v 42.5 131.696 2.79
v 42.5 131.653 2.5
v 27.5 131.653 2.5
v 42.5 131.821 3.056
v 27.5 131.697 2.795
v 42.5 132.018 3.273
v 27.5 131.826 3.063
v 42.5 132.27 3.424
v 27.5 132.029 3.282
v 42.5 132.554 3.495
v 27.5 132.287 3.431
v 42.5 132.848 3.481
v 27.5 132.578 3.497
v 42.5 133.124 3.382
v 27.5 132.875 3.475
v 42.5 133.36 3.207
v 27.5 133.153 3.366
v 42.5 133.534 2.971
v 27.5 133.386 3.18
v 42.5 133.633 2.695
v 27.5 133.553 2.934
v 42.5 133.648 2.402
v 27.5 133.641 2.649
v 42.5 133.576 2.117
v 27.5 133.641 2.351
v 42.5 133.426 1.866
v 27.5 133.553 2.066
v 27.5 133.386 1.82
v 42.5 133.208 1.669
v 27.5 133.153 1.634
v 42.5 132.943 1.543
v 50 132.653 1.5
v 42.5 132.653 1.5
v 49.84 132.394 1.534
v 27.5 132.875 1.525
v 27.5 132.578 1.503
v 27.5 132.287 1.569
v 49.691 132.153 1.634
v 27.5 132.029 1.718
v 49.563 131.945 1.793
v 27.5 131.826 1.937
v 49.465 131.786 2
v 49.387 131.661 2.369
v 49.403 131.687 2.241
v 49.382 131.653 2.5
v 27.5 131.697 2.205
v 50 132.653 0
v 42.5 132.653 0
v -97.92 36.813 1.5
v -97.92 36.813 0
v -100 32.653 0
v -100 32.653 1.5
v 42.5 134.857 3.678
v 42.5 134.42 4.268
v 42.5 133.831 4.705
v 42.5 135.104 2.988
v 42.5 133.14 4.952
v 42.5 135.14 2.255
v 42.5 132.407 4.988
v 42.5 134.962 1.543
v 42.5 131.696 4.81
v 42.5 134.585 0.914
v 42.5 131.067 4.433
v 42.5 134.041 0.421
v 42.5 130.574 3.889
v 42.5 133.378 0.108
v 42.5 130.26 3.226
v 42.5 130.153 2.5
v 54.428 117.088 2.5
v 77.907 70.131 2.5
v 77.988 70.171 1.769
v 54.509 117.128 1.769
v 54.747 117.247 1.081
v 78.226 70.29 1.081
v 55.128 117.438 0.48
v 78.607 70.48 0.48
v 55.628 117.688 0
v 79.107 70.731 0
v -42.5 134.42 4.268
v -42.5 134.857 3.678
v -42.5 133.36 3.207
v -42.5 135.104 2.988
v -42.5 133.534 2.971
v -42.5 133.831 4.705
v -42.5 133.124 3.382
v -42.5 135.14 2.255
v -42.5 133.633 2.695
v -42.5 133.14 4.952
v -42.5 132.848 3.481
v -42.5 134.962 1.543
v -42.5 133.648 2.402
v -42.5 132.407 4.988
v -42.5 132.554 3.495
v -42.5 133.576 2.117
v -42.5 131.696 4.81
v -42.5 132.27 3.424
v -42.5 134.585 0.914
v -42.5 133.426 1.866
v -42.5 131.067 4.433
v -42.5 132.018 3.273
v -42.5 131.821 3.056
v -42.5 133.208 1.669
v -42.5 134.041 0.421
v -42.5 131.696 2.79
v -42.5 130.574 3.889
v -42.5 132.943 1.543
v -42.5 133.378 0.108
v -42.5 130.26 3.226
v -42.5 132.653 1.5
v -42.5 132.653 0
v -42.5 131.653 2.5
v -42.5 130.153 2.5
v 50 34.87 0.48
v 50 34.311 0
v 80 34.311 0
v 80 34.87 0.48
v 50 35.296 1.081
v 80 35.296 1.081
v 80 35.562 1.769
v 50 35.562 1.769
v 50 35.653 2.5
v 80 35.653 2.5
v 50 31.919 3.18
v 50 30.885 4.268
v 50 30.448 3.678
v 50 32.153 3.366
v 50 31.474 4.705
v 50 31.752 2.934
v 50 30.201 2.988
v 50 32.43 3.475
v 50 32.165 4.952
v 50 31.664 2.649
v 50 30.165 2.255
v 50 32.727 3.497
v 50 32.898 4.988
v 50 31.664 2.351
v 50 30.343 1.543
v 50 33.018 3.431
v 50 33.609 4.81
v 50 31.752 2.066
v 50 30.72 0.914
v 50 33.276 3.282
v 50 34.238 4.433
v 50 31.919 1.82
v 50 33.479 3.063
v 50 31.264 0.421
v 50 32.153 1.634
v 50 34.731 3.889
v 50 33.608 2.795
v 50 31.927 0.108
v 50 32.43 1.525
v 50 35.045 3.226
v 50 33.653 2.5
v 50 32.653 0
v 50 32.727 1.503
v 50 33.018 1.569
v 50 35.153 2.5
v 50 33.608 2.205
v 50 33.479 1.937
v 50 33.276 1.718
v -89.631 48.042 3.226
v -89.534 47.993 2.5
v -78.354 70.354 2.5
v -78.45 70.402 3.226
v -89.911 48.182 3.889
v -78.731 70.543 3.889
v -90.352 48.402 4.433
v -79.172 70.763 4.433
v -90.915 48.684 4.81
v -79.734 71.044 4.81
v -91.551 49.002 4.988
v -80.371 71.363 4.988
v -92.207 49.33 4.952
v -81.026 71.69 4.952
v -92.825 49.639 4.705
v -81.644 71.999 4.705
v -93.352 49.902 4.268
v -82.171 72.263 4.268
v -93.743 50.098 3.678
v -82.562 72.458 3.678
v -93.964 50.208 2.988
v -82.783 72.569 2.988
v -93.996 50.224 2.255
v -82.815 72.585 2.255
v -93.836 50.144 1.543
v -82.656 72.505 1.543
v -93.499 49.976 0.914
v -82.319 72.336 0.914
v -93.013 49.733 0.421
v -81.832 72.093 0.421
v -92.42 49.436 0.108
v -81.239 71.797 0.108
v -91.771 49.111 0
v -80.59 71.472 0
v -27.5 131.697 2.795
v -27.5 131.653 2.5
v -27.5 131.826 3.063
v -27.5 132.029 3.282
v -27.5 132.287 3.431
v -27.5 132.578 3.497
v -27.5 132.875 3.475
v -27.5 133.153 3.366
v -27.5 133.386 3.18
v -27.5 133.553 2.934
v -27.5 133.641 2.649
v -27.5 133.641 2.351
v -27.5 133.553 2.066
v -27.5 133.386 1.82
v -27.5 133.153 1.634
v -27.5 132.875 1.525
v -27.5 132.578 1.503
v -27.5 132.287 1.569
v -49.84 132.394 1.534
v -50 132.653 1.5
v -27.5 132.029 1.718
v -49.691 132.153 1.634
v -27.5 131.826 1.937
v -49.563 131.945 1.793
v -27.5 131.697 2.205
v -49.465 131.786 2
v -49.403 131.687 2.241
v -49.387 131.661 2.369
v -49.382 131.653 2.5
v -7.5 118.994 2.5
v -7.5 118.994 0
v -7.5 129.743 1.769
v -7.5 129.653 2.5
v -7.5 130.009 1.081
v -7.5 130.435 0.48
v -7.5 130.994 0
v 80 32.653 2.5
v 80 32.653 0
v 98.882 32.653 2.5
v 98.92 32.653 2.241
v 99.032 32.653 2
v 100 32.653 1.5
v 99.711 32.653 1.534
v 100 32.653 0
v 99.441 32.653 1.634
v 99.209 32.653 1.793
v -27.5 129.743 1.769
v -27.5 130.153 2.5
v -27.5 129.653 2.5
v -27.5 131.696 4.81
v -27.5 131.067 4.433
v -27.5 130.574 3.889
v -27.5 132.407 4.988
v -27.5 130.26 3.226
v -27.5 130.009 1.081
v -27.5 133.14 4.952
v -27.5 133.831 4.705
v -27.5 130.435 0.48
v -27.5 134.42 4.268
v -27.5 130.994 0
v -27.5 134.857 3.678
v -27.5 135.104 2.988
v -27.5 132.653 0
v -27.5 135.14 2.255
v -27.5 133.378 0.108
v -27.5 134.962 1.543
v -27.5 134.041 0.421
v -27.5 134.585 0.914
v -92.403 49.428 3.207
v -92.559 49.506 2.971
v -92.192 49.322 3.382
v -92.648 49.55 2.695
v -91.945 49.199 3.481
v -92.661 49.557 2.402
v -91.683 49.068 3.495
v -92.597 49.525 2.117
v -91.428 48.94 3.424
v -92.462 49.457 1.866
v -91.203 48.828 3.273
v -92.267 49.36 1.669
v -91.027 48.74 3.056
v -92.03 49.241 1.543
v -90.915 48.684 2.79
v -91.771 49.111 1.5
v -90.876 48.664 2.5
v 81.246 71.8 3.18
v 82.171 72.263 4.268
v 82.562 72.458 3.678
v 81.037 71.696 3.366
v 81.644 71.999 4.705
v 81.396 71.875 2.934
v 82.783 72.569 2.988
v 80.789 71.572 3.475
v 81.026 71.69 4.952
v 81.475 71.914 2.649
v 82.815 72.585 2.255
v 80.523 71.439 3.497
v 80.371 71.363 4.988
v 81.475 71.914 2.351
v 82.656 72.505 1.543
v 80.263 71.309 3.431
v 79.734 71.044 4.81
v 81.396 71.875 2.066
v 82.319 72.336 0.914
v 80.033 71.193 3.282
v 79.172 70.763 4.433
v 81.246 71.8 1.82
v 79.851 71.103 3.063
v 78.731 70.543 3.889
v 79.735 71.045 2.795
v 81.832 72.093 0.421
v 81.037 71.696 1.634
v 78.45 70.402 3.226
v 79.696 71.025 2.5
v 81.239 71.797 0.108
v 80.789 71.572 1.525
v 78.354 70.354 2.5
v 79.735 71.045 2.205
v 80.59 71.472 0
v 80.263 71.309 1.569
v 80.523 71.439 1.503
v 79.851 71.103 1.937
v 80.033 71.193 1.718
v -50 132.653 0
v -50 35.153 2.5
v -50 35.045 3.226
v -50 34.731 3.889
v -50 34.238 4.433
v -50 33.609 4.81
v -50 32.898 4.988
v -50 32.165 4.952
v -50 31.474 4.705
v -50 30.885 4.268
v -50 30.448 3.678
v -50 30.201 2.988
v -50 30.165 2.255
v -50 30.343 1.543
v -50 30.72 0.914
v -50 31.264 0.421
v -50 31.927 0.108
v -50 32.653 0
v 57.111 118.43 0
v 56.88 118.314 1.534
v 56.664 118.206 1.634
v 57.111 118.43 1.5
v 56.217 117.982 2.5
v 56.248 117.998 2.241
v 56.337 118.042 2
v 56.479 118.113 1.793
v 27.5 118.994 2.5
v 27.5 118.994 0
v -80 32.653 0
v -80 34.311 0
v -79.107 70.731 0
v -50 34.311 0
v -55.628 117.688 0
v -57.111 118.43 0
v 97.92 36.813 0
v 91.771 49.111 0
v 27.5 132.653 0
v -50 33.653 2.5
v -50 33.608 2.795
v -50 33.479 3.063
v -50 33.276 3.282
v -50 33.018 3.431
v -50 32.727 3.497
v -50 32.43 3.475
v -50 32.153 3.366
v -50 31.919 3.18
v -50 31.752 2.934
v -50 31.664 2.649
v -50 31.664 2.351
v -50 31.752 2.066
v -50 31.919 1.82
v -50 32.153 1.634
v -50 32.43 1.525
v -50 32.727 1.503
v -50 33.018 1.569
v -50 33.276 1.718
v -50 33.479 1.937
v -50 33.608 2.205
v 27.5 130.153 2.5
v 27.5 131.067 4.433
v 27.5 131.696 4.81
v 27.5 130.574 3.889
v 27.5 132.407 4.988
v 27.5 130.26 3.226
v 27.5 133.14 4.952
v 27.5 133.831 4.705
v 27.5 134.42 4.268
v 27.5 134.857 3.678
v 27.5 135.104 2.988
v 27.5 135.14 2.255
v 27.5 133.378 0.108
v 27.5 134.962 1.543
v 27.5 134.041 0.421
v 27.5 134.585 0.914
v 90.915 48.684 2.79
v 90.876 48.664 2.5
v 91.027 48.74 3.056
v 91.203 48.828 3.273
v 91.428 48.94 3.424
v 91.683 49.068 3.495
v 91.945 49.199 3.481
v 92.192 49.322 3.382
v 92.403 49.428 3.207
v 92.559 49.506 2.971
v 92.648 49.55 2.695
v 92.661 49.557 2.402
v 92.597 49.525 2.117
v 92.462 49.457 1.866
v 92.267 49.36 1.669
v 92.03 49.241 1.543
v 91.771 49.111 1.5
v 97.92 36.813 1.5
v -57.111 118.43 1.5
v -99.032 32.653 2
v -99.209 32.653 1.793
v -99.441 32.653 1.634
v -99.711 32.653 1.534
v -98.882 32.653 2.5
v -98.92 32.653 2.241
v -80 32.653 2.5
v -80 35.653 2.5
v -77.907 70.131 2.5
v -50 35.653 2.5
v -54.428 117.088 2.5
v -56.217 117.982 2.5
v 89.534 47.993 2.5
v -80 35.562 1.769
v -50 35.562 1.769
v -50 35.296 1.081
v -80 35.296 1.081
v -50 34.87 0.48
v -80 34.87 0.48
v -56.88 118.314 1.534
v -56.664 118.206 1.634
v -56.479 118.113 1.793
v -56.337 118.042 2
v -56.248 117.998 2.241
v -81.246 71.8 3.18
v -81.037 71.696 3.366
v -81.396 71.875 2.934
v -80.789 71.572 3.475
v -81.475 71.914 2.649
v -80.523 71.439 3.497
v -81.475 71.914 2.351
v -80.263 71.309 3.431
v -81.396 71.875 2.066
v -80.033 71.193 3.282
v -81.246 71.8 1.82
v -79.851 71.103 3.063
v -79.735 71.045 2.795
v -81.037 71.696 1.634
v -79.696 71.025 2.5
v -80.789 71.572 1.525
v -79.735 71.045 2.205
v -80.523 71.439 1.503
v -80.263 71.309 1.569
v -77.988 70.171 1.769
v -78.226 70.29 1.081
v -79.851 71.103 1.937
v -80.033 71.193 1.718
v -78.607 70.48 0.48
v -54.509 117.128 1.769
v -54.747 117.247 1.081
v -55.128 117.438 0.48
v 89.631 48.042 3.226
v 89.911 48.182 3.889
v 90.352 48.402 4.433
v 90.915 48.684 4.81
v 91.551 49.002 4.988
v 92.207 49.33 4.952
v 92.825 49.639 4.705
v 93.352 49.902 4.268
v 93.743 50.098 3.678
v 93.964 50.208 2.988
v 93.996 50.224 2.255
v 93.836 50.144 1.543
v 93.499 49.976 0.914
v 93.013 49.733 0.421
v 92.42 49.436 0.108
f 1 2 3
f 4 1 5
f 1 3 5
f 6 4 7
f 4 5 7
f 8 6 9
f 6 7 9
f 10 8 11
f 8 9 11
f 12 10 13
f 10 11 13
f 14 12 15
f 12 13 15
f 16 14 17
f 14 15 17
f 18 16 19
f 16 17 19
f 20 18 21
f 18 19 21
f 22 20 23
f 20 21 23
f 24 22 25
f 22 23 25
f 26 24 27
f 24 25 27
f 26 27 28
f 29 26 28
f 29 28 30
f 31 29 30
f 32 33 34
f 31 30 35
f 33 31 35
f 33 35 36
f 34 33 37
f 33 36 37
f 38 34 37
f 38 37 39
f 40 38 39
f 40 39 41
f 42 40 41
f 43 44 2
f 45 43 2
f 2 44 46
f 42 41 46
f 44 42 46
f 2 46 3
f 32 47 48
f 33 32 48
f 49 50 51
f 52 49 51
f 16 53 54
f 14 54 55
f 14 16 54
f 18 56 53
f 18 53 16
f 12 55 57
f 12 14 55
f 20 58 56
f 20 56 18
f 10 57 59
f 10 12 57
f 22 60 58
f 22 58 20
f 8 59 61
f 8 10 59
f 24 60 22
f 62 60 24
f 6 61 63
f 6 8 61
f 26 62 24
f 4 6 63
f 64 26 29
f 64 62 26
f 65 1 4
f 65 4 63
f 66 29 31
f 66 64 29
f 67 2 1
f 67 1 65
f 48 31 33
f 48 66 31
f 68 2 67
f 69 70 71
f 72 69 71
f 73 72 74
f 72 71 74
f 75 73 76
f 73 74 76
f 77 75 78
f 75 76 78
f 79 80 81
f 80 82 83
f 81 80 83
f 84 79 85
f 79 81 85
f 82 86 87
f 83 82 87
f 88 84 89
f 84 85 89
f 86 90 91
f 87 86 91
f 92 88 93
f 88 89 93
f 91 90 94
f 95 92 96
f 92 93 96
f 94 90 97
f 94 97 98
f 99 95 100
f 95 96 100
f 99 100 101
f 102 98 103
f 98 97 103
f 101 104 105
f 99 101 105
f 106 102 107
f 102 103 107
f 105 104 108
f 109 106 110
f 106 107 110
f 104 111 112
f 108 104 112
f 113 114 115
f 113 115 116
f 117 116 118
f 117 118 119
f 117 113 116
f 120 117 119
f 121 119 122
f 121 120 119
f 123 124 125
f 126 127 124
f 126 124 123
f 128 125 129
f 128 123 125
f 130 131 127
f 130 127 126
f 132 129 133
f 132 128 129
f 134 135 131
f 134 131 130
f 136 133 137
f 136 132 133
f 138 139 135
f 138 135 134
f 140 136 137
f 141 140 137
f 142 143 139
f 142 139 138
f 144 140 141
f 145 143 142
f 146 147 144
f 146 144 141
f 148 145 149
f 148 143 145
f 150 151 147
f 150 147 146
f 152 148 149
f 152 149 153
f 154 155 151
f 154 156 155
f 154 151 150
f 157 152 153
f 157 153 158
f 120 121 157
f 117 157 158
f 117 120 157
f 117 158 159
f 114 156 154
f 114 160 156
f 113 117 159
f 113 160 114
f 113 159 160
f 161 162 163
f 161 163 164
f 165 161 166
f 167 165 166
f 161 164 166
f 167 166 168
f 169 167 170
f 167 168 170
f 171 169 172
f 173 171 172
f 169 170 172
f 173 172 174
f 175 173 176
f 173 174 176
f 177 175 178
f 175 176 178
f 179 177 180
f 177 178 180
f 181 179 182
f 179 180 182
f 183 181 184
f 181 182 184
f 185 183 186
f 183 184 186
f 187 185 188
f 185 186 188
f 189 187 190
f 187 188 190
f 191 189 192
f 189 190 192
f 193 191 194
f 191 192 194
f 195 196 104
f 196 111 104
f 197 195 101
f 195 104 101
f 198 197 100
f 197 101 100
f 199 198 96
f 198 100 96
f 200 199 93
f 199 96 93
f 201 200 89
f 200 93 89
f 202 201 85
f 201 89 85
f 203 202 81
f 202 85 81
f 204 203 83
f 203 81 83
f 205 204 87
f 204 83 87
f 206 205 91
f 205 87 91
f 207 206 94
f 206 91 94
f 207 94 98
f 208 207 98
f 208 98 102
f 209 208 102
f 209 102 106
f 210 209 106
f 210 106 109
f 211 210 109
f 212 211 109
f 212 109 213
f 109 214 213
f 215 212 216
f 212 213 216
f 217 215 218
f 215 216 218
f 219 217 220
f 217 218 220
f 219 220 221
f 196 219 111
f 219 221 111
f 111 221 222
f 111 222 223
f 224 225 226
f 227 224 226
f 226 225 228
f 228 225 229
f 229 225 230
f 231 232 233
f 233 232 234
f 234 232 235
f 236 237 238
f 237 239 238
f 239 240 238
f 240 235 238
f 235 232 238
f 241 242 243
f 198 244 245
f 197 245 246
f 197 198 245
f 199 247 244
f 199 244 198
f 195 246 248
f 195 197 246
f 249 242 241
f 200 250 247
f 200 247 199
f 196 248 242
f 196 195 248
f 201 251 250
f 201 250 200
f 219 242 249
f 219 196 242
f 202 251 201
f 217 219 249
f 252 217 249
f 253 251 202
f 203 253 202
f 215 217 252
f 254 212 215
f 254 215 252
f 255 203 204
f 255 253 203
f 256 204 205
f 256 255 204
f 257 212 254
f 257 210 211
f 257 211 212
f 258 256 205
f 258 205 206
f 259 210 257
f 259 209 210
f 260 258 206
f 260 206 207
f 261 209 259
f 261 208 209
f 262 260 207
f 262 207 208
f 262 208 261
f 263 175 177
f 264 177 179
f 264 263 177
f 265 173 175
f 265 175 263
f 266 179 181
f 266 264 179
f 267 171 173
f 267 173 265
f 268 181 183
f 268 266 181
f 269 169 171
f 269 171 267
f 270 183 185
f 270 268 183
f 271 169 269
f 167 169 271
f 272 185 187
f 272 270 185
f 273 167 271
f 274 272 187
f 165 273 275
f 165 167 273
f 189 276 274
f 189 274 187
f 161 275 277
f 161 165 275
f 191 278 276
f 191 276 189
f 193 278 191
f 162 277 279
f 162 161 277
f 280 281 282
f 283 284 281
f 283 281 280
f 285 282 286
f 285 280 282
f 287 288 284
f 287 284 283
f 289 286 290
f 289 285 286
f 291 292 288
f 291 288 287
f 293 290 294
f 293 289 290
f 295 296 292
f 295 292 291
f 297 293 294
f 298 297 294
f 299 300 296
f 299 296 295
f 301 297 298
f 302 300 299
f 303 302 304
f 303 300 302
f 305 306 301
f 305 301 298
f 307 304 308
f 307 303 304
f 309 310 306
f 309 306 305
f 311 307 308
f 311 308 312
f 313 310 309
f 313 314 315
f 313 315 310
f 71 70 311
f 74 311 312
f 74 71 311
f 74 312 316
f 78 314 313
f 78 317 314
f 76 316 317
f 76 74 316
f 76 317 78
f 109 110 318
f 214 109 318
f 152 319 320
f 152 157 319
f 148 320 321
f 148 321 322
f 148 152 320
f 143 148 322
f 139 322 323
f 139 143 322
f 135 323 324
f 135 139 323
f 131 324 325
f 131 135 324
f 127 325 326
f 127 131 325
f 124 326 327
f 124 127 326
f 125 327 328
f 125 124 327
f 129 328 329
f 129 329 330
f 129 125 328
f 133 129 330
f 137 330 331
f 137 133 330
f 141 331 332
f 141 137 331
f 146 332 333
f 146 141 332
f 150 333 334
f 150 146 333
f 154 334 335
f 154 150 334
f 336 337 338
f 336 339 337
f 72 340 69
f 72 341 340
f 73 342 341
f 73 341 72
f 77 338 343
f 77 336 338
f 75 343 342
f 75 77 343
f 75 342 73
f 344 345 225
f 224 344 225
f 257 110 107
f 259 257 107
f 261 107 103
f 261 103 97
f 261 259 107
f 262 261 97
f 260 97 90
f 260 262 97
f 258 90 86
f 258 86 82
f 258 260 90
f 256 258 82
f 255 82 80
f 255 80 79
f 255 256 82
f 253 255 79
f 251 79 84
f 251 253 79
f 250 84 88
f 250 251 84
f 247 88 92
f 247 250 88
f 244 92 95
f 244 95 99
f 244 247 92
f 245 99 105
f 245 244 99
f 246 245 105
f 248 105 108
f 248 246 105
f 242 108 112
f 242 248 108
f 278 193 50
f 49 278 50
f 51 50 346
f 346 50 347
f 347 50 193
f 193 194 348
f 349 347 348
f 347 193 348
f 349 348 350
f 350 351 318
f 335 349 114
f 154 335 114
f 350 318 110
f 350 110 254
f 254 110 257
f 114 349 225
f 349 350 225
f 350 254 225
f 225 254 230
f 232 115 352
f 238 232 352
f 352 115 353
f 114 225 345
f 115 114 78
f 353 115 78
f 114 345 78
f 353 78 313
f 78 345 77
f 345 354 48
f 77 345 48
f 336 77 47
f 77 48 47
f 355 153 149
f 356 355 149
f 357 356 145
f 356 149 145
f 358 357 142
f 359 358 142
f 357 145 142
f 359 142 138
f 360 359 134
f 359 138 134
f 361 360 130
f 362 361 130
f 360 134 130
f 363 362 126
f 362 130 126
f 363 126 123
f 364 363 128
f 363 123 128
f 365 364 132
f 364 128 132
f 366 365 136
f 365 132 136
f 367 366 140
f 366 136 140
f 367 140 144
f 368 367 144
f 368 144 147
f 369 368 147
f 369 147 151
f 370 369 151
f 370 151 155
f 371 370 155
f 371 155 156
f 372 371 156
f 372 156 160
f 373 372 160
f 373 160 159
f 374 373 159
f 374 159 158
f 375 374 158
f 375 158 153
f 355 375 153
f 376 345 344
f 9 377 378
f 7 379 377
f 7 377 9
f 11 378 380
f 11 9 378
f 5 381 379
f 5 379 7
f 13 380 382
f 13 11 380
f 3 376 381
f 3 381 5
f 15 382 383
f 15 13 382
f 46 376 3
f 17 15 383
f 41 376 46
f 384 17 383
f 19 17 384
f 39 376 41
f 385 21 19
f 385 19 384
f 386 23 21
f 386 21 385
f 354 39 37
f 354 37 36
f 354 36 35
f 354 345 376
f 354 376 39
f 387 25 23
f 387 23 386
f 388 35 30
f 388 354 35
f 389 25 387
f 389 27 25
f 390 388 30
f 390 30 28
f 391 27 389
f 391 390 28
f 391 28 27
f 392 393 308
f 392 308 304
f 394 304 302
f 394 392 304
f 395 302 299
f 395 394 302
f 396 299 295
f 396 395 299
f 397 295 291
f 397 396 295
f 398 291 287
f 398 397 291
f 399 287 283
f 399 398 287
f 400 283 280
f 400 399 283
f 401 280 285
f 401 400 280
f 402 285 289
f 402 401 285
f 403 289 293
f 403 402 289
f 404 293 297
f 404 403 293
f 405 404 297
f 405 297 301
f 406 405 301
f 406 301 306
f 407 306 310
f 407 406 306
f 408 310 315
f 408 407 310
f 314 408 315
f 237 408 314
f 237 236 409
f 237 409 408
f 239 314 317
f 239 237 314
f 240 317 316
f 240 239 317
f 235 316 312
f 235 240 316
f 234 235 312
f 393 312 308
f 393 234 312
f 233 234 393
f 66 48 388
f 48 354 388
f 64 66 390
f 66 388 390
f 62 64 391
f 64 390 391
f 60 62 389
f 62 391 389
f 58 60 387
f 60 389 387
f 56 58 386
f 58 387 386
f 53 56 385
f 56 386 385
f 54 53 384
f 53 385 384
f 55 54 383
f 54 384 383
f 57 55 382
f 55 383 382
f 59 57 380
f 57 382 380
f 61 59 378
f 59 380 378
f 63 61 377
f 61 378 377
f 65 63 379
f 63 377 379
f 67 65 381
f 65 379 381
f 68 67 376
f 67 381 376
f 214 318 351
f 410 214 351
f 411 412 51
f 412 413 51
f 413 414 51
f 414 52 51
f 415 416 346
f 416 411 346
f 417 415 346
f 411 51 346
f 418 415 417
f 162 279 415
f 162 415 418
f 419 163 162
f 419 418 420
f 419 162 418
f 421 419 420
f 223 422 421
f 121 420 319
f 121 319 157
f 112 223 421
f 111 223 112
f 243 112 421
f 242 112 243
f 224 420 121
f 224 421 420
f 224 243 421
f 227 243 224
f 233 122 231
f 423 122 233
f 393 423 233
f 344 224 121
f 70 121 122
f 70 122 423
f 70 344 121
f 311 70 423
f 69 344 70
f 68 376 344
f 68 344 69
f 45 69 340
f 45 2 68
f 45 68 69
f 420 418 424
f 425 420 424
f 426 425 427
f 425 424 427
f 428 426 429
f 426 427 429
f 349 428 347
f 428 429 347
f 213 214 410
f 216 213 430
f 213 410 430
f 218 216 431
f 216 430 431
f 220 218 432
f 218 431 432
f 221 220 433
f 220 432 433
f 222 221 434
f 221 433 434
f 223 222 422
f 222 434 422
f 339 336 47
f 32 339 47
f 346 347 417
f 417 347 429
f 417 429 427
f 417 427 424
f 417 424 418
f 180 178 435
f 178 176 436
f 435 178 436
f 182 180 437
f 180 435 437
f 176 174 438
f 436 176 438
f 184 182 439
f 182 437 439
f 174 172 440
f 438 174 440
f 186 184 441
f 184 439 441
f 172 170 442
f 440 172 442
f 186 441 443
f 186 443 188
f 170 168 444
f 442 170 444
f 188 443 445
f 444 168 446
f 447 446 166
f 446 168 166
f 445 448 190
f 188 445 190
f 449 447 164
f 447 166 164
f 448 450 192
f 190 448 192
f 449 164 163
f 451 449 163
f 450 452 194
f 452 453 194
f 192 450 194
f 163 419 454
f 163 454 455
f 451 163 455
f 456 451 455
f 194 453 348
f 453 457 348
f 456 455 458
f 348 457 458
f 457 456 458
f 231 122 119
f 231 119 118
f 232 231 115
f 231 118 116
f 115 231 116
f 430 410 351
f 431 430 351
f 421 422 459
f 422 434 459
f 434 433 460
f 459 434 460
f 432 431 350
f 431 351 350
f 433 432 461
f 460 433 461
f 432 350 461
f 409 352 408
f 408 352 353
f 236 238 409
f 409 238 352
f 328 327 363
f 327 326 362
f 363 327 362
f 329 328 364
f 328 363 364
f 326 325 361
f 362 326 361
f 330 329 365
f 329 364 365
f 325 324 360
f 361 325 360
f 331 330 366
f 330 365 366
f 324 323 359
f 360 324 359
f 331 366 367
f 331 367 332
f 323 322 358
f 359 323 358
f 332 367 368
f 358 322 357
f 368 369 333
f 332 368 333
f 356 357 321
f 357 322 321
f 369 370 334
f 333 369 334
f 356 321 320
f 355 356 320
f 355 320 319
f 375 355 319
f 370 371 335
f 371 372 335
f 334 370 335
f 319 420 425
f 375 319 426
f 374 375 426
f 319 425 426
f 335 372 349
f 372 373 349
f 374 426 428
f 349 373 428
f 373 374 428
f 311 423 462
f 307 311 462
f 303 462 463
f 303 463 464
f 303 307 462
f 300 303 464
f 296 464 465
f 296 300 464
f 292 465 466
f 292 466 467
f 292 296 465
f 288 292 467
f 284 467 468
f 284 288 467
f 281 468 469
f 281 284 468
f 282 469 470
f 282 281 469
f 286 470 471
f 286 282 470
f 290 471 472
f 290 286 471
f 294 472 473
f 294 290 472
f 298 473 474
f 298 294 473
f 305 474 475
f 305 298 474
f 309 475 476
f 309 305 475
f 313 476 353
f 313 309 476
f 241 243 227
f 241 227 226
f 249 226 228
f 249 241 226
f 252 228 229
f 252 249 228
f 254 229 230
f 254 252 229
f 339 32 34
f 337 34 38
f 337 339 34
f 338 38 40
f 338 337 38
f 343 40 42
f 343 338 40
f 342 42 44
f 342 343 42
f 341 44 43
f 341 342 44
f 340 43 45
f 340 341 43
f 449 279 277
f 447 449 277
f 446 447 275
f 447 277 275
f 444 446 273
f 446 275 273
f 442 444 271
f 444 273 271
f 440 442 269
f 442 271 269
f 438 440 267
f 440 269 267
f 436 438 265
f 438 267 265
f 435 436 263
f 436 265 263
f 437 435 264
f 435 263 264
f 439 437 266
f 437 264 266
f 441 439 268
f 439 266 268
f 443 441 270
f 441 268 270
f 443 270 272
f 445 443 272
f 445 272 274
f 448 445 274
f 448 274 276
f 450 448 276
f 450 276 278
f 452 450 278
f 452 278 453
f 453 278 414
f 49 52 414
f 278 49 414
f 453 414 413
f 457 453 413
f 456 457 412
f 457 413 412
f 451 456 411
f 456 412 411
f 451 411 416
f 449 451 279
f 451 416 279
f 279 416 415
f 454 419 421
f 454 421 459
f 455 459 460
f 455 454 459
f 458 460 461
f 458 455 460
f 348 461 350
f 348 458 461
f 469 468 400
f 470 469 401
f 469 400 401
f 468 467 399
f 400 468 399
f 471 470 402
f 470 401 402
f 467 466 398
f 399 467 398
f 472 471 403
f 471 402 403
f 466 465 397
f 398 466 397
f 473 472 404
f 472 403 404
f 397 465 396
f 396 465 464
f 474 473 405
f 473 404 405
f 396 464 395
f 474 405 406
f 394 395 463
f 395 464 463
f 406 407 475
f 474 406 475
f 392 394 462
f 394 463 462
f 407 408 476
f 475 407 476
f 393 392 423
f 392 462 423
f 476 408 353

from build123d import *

# Parameters (mm, degrees)
EXTRUDE_1_DEPTH      = 5
SKETCH_9_W           = 30
SKETCH_9_H           = 5
SKETCH_10_R          = 2
CUT_EXTRUDE_3_DEPTH  = 352.212186577
SKETCH_4_W           = 5
SKETCH_4_H           = 50
SKETCH_11_R          = 2
CUT_EXTRUDE_4_DEPTH  = 338.069639722
SKETCH_12_R          = 6
CUT_EXTRUDE_5_DEPTH  = 105
SKETCH_14_R          = 6
CUT_EXTRUDE_6_DEPTH  = 110
SKETCH_3_W           = 200
SKETCH_3_H           = 5
SKETCH_15_R          = 2
CUT_EXTRUDE_7_DEPTH  = 200
SKETCH_16_R          = 6
CUT_EXTRUDE_8_DEPTH  = 60
CUT_EXTRUDE_START    = 60
SKETCH_17_R          = 6
CUT_EXTRUDE_9_DEPTH  = 60
SCALE_1_SCALE        = 0.5
SKETCH_19_W          = 35
SKETCH_19_H          = 12
CUT_EXTRUDE_11_DEPTH = 10


with BuildPart() as part:
    # 草图2 → 凸台-拉伸1 (new body)
    with BuildSketch(Plane(origin=(0, 65.305030884, 0), x_dir=(1, 0, 0), z_dir=(0, 0, 1))):
        Polygon((-200, 0), (-155, 0), (-105, 0), (105, 0), (155, 0), (200, 0), (195.839393539, 8.321212923), (151.118033989, 97.763932023), (100, 200), (50, 200), (-50, 200), (-100, 200), (-151.118033989, 97.763932023), (-195.839393539, 8.321212923), align=None)
    extrude(amount=EXTRUDE_1_DEPTH)

    # 草图9 → 旋转1 (revolve)
    with BuildSketch(Plane(origin=(0, 65.305030884, 5), x_dir=(1, 0, 0), z_dir=(0, 0, 1))):
        with Locations((-70, 197.5)):
            Rectangle(SKETCH_9_W, SKETCH_9_H)
    revolve_1 = revolve(axis=Axis((-85, 265.305030884, 5), (1, 0, 0)))

    # 草图10 → 切除-拉伸3 (cut, symmetric)
    with BuildSketch(Plane(origin=(-85, 65.305030884, 0), x_dir=(0, 0, 1), z_dir=(-1, 0, 0))):
        with Locations(Location((5, 200, 0), (0, 0, 270))):
            Circle(SKETCH_10_R)
    cut_extrude_3 = extrude(amount=CUT_EXTRUDE_3_DEPTH, both=True, mode=Mode.SUBTRACT)

    # 镜向2: 旋转1, 切除-拉伸3 across plane
    add(revolve_1.mirror(Plane(origin=(0, 0, 0), x_dir=(0, 0, 1), z_dir=(1, 0, 0))))
    add(cut_extrude_3.mirror(Plane(origin=(0, 0, 0), x_dir=(0, 0, 1), z_dir=(1, 0, 0))), mode=Mode.SUBTRACT)

    # 草图4 → 旋转2 (revolve)
    with BuildSketch(Plane(origin=(-160, 145.305030884, 0), x_dir=(0, 0, 1), z_dir=(-0.8944271909999162, 0.4472135954999576, 0))):
        with Locations((2.5, -27.639320225)):
            Rectangle(SKETCH_4_W, SKETCH_4_H)
    revolve_2 = revolve(axis=Axis((-161.180339887, 142.944351109, 5), (-0.4472135954999577, -0.894427190999916, 0)))

    # 草图11 → 切除-拉伸4 (cut, symmetric)
    with BuildSketch(Plane(origin=(-23.541019662, 18.222991559, 0), x_dir=(0.8944271909999161, -0.4472135954999577, 0), z_dir=(-0.4472135954999577, -0.8944271909999161, 0))):
        with Locations((-178.8854382, 5)):
            Circle(SKETCH_11_R)
    cut_extrude_4 = extrude(amount=CUT_EXTRUDE_4_DEPTH, both=True, mode=Mode.SUBTRACT)

    # 草图12 → 切除-拉伸5 (cut)
    with BuildSketch(Plane(origin=(-1.180339887, 62.944351109, 0), x_dir=(0.8944271909999161, -0.4472135954999577, 0), z_dir=(0.4472135954999577, 0.8944271909999161, 0))):
        with Locations((-178.8854382, -5)):
            Circle(SKETCH_12_R)
    cut_extrude_5 = extrude(amount=CUT_EXTRUDE_5_DEPTH, mode=Mode.SUBTRACT)

    # 草图14 → 切除-拉伸6 (cut)
    # profile 1 of 2: a face of its own
    with BuildSketch(Plane(origin=(-55, 65.305030884, 0), x_dir=(0, 0, -1), z_dir=(1, 0, 0))):
        with Locations((-5, 200)):
            Circle(SKETCH_14_R)
        with BuildLine():
            Line((-5, 195), (-5, 198))
            ThreePointArc((-5, 198), (-6.414213562, 201.414213562), (-3, 200))
            Line((-3, 200), (0, 200))
            ThreePointArc((0, 200), (-8.535533906, 203.535533906), (-5, 195))
        make_face(mode=Mode.SUBTRACT)
    # profile 2 of 2: a face of its own
    with BuildSketch(Plane(origin=(-55, 65.305030884, 0), x_dir=(0, 0, -1), z_dir=(1, 0, 0))):
        with BuildLine():
            ThreePointArc((0, 200), (-8.535533906, 203.535533906), (-5, 195))
            Line((-5, 195), (-5, 198))
            ThreePointArc((-5, 198), (-6.414213562, 201.414213562), (-3, 200))
            Line((-3, 200), (0, 200))
        make_face()
    extrude(amount=CUT_EXTRUDE_6_DEPTH, mode=Mode.SUBTRACT)

    # 镜向3: 旋转2, 切除-拉伸4, 切除-拉伸5 across plane
    add(revolve_2.mirror(Plane(origin=(0, 0, 0), x_dir=(0, 0, 1), z_dir=(1, 0, 0))))
    add(cut_extrude_4.mirror(Plane(origin=(0, 0, 0), x_dir=(0, 0, 1), z_dir=(1, 0, 0))), mode=Mode.SUBTRACT)
    add(cut_extrude_5.mirror(Plane(origin=(0, 0, 0), x_dir=(0, 0, 1), z_dir=(1, 0, 0))), mode=Mode.SUBTRACT)

    # 草图3 → 旋转3 (revolve)
    with BuildSketch(Plane.XZ.offset(-65.305030884)):
        with Locations((0, 2.5)):
            Rectangle(SKETCH_3_W, SKETCH_3_H)
    revolve(axis=Axis((-100, 65.305030884, 5), (1, 0, 0)))

    # 草图15 → 切除-拉伸7 (cut)
    with BuildSketch(Plane(origin=(100, 65.305030884, 0), x_dir=(0, 0, -1), z_dir=(1, 0, 0))):
        with Locations(Location((-5, 0, 0), (0, 0, 90))):
            Circle(SKETCH_15_R)
    extrude(amount=-CUT_EXTRUDE_7_DEPTH, mode=Mode.SUBTRACT)

    # 草图16 → 切除-拉伸8 (cut)
    with BuildSketch(Plane(origin=(100, 65.305030884, 0), x_dir=(0, 0, -1), z_dir=(1, 0, 0))):
        with Locations((-5, 0)):
            Circle(SKETCH_16_R)
    extrude(amount=CUT_EXTRUDE_8_DEPTH, mode=Mode.SUBTRACT)

    # 草图17 → 切除-拉伸9 (cut)
    with BuildSketch(Plane(origin=(-100, 65.305030884, 0), x_dir=(0, 0, 1), z_dir=(-1, 0, 0)).offset(CUT_EXTRUDE_START)):
        with Locations((5, 0)):
            Circle(SKETCH_17_R)
    extrude(amount=-CUT_EXTRUDE_9_DEPTH, mode=Mode.SUBTRACT)


with BuildPart() as part_1:
    # 缩放比例1: scaled about (0, 0, 0)
    add(part.part.scale(SCALE_1_SCALE))

    # 草图19 → 切除-拉伸11 (cut)
    with BuildSketch(Plane(origin=(0, 0, 0), x_dir=(-1, 0, 0), z_dir=(0, 0, -1))):
        with Locations((-10, 124.994203047)):
            Rectangle(SKETCH_19_W, SKETCH_19_H)
    extrude(amount=-CUT_EXTRUDE_11_DEPTH, mode=Mode.SUBTRACT)


solid = part_1.part
